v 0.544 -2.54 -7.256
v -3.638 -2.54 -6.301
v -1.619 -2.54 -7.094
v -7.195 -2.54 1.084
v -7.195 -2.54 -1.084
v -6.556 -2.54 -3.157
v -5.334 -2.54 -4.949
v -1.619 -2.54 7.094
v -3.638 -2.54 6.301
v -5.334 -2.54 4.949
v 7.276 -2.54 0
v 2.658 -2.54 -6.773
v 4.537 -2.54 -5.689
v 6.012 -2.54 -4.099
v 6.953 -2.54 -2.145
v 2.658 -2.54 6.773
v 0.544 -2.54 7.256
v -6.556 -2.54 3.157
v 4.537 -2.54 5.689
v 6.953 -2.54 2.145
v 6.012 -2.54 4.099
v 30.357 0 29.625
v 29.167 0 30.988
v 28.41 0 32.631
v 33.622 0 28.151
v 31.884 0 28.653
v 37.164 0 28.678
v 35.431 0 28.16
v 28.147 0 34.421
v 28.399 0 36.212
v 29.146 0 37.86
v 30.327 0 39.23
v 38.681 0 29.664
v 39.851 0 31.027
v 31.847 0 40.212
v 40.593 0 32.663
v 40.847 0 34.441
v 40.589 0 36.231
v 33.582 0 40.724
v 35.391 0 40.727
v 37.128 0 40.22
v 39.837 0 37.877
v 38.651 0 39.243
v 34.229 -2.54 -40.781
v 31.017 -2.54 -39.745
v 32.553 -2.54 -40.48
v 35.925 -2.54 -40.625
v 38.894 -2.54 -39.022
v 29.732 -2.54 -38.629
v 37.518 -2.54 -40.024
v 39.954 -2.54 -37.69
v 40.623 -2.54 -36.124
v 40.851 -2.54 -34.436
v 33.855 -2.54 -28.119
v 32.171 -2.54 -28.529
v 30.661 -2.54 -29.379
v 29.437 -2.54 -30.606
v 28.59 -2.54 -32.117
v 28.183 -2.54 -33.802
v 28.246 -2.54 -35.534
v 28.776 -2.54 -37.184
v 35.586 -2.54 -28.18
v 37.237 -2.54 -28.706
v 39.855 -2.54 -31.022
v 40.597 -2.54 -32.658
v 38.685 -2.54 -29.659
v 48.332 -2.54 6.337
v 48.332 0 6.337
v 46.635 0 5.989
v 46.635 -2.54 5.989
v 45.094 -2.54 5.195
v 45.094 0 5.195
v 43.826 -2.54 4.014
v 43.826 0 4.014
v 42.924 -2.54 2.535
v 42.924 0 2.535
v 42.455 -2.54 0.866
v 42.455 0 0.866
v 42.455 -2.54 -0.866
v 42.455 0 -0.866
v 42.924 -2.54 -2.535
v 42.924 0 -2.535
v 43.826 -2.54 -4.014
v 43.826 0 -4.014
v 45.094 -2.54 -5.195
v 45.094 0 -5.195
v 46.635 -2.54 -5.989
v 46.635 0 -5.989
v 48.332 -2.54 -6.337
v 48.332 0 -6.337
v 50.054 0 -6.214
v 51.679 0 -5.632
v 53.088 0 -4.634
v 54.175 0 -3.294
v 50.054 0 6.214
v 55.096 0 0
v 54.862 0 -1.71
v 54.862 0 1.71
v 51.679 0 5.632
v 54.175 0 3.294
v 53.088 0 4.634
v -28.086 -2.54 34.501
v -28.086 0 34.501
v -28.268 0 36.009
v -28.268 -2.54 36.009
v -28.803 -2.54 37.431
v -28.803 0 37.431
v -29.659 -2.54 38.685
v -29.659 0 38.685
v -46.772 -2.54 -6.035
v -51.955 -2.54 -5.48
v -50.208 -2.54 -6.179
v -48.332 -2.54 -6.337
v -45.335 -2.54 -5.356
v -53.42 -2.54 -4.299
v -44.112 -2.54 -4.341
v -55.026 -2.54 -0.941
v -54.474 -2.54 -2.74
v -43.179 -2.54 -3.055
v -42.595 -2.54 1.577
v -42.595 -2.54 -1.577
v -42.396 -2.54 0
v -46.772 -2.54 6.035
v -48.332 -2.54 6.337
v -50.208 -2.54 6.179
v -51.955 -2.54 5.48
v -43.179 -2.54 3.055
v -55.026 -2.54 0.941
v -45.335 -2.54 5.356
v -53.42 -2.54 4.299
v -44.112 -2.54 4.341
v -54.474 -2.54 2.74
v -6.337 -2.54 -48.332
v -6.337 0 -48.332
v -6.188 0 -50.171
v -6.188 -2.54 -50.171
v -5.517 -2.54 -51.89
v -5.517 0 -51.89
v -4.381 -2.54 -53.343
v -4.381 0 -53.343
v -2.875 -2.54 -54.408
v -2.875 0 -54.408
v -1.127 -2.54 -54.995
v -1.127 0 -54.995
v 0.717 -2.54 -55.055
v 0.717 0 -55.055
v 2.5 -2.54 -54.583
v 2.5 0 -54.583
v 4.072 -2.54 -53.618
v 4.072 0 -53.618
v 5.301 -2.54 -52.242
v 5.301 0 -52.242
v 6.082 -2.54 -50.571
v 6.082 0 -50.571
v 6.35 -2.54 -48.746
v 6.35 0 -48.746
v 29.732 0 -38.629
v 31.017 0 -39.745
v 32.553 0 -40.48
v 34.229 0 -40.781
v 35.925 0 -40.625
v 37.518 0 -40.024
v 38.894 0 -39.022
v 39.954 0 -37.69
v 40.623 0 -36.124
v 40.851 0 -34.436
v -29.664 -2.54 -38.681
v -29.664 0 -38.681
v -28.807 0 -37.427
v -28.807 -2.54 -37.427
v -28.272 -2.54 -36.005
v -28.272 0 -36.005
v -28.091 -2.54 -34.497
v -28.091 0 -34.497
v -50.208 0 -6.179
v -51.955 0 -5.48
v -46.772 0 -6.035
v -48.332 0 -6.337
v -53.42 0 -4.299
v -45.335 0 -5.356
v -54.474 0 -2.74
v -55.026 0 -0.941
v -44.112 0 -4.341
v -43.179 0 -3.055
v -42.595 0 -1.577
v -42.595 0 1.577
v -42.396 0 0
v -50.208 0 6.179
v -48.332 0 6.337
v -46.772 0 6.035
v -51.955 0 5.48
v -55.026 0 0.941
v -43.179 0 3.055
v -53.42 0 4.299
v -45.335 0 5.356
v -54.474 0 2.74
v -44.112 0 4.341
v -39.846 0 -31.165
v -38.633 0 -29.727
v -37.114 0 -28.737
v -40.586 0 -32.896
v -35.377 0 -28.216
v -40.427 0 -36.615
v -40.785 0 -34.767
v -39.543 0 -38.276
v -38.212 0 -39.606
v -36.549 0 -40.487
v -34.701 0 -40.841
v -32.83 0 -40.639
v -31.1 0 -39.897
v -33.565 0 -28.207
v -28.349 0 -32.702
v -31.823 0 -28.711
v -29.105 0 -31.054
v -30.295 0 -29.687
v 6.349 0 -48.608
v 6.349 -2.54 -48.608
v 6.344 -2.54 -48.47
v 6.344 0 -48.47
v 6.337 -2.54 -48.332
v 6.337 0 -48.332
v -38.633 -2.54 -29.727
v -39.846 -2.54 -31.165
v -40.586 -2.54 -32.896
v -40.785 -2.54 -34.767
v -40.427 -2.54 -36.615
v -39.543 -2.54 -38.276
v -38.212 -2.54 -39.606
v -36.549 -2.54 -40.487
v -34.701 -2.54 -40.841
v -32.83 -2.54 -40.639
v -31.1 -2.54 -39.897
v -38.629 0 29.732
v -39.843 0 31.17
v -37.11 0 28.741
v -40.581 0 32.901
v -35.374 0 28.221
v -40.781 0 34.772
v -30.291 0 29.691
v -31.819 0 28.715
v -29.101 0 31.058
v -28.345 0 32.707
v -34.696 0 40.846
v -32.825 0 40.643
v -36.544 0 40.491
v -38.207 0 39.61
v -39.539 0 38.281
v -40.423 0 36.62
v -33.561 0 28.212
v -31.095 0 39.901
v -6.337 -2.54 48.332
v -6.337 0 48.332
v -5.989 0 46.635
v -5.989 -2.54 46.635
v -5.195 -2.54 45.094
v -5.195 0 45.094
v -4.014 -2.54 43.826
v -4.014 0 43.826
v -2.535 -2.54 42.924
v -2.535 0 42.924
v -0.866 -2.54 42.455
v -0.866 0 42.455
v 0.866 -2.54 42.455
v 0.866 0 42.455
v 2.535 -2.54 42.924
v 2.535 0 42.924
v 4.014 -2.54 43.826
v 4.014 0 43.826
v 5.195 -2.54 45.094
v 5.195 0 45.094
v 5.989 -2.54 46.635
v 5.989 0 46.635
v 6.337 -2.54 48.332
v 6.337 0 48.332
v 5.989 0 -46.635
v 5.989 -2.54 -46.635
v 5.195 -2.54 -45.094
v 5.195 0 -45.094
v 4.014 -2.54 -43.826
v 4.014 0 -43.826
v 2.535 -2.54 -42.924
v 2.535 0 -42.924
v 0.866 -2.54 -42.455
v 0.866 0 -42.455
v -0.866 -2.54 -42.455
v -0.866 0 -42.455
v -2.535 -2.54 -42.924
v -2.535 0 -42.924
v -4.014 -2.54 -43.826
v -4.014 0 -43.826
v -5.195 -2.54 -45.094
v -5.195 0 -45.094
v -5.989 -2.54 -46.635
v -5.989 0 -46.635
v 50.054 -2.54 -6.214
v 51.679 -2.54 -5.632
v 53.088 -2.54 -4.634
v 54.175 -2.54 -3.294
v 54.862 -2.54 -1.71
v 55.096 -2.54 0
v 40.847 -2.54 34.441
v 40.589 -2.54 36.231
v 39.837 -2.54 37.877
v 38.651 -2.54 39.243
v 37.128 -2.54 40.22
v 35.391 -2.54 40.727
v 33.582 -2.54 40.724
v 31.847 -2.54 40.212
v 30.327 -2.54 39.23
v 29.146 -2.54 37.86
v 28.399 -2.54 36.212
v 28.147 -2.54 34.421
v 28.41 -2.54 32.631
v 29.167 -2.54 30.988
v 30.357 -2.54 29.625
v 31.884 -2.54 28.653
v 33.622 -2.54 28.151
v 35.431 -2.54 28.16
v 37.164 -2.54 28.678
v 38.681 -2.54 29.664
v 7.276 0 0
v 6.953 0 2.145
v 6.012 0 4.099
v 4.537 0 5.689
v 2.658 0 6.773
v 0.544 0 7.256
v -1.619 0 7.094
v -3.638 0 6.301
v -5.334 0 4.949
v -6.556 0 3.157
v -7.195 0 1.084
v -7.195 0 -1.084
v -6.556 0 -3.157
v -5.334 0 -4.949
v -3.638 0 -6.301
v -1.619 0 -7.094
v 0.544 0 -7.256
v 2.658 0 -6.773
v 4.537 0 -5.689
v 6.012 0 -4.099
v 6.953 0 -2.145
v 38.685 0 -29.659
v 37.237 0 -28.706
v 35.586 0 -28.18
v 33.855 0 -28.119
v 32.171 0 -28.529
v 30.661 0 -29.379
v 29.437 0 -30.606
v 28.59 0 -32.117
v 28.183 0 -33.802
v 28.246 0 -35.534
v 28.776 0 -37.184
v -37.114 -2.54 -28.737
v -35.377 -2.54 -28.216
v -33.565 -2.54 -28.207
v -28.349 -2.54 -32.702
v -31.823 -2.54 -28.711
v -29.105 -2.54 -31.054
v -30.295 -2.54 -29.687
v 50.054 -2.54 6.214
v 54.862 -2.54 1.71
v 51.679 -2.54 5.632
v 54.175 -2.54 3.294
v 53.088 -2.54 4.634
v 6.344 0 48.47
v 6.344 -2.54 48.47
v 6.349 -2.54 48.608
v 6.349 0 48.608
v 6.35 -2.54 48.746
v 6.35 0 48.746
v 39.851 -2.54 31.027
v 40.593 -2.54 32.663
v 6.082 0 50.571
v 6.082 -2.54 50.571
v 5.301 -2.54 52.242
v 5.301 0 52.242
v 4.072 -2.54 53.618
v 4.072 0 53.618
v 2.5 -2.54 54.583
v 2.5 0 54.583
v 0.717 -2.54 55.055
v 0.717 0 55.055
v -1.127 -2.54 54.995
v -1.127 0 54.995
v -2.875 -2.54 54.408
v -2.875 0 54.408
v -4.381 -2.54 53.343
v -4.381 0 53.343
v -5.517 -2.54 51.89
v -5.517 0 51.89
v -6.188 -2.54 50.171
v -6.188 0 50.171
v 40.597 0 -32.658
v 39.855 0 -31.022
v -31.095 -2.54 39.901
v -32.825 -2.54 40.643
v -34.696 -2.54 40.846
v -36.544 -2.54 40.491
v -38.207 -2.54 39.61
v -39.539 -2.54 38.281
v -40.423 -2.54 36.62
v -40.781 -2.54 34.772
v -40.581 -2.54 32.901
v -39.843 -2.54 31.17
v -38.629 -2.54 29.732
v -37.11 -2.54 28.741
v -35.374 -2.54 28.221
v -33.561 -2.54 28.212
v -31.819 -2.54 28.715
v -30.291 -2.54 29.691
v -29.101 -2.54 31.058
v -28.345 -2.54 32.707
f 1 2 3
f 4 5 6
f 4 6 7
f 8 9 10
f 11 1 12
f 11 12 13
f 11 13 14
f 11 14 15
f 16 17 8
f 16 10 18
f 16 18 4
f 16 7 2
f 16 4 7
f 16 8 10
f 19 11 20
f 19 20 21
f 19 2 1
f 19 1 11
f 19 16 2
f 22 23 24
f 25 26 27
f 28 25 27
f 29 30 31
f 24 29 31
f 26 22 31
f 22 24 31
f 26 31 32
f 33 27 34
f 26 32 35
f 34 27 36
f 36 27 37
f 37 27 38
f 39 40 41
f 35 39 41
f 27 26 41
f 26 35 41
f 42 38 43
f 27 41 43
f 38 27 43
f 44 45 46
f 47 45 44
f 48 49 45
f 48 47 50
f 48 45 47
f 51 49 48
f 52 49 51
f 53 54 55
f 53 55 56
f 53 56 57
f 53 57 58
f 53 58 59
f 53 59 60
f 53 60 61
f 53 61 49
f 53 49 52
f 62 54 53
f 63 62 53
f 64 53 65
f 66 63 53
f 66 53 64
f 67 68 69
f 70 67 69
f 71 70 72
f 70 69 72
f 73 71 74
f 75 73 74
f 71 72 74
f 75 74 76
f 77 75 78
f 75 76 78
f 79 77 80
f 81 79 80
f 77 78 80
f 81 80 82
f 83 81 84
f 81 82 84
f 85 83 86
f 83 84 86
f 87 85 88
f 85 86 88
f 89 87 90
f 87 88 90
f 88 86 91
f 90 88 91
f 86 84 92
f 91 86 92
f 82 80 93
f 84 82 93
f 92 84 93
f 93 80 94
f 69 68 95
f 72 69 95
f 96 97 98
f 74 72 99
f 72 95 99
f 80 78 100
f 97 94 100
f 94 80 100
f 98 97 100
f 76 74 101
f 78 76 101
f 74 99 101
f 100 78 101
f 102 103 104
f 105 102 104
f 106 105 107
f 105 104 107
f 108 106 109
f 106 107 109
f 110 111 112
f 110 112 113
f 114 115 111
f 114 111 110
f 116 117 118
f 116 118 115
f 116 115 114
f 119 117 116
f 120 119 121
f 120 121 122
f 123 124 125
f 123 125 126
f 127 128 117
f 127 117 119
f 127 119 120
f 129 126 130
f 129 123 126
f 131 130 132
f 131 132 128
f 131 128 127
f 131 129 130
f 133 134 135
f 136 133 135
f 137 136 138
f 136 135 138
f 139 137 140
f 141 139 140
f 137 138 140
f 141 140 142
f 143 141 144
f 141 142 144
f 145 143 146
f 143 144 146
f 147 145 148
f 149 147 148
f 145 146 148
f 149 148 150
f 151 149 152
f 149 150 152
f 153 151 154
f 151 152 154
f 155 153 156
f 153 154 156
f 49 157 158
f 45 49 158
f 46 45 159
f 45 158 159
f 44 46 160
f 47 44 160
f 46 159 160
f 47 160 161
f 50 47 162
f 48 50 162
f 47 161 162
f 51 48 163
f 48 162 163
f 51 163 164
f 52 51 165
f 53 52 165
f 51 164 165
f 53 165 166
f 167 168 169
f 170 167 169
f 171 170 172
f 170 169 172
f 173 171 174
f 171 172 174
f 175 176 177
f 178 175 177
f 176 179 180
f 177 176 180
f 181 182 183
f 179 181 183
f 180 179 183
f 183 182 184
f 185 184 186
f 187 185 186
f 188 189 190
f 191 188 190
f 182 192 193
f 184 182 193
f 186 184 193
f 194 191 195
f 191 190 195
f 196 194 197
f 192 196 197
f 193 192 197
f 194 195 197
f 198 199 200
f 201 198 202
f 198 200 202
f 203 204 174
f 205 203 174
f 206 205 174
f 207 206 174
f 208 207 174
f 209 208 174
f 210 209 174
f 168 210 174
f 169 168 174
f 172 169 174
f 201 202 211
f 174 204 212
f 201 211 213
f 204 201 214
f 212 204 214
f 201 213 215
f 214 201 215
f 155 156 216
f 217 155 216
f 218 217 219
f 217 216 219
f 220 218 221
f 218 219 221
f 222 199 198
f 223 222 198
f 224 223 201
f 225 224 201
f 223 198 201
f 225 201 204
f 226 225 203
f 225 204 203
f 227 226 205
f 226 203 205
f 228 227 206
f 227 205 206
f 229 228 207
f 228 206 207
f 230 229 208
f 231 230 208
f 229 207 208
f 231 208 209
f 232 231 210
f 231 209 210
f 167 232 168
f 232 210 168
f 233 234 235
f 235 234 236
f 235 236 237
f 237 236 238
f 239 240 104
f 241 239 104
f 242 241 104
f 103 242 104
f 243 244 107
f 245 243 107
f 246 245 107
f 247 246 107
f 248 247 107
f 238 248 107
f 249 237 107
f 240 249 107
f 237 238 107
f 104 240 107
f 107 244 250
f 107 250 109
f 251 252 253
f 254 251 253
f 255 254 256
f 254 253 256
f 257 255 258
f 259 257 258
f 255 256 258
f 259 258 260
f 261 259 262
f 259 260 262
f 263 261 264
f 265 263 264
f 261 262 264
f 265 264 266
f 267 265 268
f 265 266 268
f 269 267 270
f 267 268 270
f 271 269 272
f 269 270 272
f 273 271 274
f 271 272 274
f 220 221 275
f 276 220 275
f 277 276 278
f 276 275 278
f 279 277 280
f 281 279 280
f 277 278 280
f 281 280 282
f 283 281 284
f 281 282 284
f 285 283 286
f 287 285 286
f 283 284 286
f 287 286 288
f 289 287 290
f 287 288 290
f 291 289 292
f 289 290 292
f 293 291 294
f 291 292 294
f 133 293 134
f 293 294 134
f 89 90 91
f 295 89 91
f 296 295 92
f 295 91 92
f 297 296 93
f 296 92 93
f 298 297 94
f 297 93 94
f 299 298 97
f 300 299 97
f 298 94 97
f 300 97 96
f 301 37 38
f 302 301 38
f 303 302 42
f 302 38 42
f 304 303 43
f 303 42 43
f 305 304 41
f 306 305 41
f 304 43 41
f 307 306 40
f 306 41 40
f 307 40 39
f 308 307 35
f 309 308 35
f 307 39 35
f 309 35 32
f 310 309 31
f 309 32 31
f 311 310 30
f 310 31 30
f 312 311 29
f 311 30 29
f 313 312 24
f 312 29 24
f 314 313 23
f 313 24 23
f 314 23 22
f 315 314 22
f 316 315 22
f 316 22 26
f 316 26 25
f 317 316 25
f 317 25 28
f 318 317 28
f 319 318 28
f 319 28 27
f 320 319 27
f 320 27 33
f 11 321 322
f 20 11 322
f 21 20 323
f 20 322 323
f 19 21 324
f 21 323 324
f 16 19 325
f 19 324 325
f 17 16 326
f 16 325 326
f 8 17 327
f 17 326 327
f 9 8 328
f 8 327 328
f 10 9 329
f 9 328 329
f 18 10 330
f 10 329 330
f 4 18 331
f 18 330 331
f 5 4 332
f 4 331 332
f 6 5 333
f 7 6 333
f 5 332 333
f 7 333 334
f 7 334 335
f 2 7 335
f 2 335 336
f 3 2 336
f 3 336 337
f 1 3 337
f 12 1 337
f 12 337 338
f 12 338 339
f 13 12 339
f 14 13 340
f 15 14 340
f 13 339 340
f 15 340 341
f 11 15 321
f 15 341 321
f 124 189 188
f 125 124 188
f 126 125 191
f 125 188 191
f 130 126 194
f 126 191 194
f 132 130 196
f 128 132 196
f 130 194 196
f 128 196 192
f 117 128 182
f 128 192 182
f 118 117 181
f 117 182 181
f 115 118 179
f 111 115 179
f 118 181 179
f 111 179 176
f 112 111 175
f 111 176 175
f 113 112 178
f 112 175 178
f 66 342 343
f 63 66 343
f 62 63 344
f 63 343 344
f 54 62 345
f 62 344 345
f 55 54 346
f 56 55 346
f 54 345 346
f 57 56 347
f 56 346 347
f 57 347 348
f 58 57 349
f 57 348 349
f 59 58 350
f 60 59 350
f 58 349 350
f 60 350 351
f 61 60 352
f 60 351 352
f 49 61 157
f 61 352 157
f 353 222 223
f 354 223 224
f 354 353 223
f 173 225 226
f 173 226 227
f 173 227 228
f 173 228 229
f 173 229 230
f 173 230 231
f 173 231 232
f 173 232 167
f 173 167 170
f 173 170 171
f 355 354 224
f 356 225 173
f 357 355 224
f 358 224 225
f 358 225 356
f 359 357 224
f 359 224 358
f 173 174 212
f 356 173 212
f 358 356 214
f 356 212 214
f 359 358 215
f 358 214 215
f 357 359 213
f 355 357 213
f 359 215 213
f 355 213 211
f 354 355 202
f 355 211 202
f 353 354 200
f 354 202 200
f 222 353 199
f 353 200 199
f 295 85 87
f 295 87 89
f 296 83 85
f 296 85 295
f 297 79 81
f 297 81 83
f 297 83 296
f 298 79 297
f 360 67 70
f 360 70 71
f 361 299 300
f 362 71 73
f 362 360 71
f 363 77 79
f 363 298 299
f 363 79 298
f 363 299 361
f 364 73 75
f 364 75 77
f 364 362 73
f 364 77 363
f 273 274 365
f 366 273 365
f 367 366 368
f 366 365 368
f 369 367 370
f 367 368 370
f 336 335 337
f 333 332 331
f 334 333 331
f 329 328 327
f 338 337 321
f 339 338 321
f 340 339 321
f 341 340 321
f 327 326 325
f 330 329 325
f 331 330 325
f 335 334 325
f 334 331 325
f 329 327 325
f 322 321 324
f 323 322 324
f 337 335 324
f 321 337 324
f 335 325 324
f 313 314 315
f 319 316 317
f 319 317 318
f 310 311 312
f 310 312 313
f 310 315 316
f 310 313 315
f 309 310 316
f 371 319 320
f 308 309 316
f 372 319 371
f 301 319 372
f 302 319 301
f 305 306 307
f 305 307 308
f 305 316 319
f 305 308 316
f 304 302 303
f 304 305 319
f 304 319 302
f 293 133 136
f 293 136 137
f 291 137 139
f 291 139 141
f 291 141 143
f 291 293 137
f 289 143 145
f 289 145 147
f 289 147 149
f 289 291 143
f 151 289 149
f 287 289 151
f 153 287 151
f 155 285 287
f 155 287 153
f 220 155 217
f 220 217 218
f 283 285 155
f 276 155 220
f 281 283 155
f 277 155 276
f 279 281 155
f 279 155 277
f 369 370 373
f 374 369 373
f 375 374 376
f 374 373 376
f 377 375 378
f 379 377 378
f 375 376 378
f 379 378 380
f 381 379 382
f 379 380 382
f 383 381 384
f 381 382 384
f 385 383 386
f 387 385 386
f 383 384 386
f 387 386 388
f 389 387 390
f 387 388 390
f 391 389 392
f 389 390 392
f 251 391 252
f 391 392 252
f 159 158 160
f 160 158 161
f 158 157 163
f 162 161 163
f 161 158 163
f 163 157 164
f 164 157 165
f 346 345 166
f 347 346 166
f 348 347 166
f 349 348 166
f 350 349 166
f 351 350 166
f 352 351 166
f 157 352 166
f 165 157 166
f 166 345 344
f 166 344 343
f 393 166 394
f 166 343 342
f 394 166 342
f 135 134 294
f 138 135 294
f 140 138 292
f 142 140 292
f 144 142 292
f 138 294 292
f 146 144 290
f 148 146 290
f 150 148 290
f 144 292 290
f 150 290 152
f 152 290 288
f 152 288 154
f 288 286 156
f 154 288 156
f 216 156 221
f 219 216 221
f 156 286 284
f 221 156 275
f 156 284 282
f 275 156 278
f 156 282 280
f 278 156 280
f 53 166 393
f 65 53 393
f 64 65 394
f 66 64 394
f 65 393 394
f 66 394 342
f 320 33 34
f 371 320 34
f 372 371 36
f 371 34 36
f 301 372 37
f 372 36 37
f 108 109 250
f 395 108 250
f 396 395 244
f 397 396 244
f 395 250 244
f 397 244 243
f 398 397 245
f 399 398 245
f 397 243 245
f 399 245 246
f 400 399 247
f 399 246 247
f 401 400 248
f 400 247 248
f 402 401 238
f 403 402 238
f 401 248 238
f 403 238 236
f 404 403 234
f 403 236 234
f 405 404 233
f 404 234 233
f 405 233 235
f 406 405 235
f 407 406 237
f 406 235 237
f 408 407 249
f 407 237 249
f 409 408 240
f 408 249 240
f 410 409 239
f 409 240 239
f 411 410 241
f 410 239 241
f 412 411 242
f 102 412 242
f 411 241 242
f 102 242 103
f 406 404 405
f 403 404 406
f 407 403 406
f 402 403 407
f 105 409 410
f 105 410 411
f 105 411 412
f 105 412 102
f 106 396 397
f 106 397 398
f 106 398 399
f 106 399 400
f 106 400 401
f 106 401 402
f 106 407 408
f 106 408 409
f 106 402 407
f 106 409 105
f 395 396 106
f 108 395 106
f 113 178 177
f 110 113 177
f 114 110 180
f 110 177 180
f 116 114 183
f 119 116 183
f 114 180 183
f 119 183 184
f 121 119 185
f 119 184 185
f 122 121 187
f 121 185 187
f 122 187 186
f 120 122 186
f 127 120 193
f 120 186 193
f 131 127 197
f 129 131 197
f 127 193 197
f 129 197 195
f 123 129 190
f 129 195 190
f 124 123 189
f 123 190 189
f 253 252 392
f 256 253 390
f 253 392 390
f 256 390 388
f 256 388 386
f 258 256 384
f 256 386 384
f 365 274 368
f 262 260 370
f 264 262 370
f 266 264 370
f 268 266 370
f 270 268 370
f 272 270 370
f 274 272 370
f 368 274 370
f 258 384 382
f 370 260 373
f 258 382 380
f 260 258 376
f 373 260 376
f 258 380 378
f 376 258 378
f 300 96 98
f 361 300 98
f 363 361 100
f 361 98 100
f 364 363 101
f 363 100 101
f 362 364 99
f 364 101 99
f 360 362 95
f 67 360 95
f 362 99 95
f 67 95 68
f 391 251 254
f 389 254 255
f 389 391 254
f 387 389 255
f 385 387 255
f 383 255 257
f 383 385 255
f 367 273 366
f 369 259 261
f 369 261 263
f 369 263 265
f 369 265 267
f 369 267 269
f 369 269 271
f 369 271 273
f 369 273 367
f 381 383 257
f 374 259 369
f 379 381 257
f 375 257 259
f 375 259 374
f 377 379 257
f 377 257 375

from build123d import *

# Parameters (mm, degrees)
F1_DEPTH = 2.54
F0_R     = 7.2761689779


with BuildPart() as f1:
    # F0 (on Front) → F1 (new body)
    with BuildSketch(Plane.XZ):
        with BuildLine():
            ThreePointArc((-38.6289761731, 29.7318574602), (-34.4363682798, 34.5009809702), (-29.6593939712, 38.6846416227))
            ThreePointArc((-29.6593939712, 38.6846416227), (-38.9222859219, 38.9953155048), (-38.628976173, 29.7318574602))
        make_face()
        with BuildLine():
            ThreePointArc((-28.0863682798, 34.5009809702), (-28.4926200155, 36.7357866822), (-29.6593939712, 38.6846416227))
            ThreePointArc((-29.6593939712, 38.6846416227), (-34.4363682798, 34.5009809702), (-38.6289761731, 29.7318574602))
            ThreePointArc((-38.628976173, 29.7318574602), (-31.8191713176, 28.7154144413), (-28.0863682798, 34.5009809702))
        make_face()
    extrude(amount=F1_DEPTH)


with BuildPart() as f1b:
    # F0 (on Front) → F1, piece 2 (new body)
    with BuildSketch(Plane.XZ):
        with BuildLine():
            ThreePointArc((6.3365161788, 48.3324912551), (0, 48.7460885427), (-6.3365161788, 48.3324912551))
            ThreePointArc((-6.3365161788, 48.3324912551), (0, 42.3960885427), (6.3365161788, 48.3324912551))
        make_face()
        with BuildLine():
            ThreePointArc((6.3365161788, 48.3324912551), (6.3466281495, 48.5391800305), (6.35, 48.7460885427))
            ThreePointArc((6.35, 48.7460885427), (-0.2069085122, 55.0927166922), (-6.3365161788, 48.3324912551))
            ThreePointArc((-6.3365161788, 48.3324912551), (0, 48.7460885427), (6.3365161788, 48.3324912551))
        make_face()
    extrude(amount=F1_DEPTH)


with BuildPart() as f1c:
    # F0 (on Front) → F1, piece 3 (new body)
    with BuildSketch(Plane.XZ):
        with BuildLine():
            ThreePointArc((38.6809602201, 29.6641949943), (34.4967067172, 34.4406500212), (29.7270628884, 38.6326659737))
            ThreePointArc((29.7270628884, 38.6326659737), (30.0029289762, 29.9541746101), (38.6809602201, 29.6641949943))
        make_face()
        with BuildLine():
            ThreePointArc((40.8467067172, 34.4406500212), (36.7367136019, 40.3824400845), (29.7270628884, 38.6326659737))
            ThreePointArc((29.7270628884, 38.6326659737), (34.4967067172, 34.4406500212), (38.6809602201, 29.6641949943))
            ThreePointArc((38.6809602201, 29.6641949943), (40.279980433, 31.8183904748), (40.8467067172, 34.4406500212))
        make_face()
    extrude(amount=F1_DEPTH)


with BuildPart() as f1d:
    # F0 (on Front) → F1, piece 4 (new body)
    with BuildSketch(Plane.XZ):
        Circle(F0_R)
    extrude(amount=F1_DEPTH)


with BuildPart() as f1e:
    # F0 (on Front) → F1, piece 5 (new body)
    with BuildSketch(Plane.XZ):
        with BuildLine():
            ThreePointArc((55.0960885427, 0), (53.0875259328, 4.6340502142), (48.3324912551, 6.3365161788))
            ThreePointArc((48.3324912551, 6.3365161788), (48.6425793232, 3.175), (48.7460885427, 0))
            ThreePointArc((48.7460885427, 0), (48.6425793232, -3.175), (48.3324912551, -6.3365161788))
            ThreePointArc((48.3324912551, -6.3365161788), (53.0875259328, -4.6340502142), (55.0960885427, 0))
        make_face()
        with BuildLine():
            ThreePointArc((48.7460885427, 0), (48.6425793232, 3.175), (48.3324912551, 6.3365161788))
            ThreePointArc((48.3324912551, 6.3365161788), (42.3960885427, 0), (48.3324912551, -6.3365161788))
            ThreePointArc((48.3324912551, -6.3365161788), (48.6425793232, -3.175), (48.7460885427, 0))
        make_face()
    extrude(amount=F1_DEPTH)


with BuildPart() as f1f:
    # F0 (on Front) → F1, piece 6 (new body)
    with BuildSketch(Plane.XZ):
        with BuildLine():
            ThreePointArc((40.8509809702, -34.4363682798), (40.2840919472, -31.81374985), (38.6846416227, -29.6593939712))
            ThreePointArc((38.6846416227, -29.6593939712), (34.5009809702, -34.4363682798), (29.7318574602, -38.628976173))
            ThreePointArc((29.7318574602, -38.628976173), (36.7413565762, -40.3780193252), (40.8509809702, -34.4363682798))
        make_face()
        with BuildLine():
            ThreePointArc((29.7318574602, -38.628976173), (34.5009809702, -34.4363682798), (38.6846416227, -29.6593939712))
            ThreePointArc((38.6846416227, -29.6593939712), (30.0066464357, -29.9504506377), (29.7318574602, -38.628976173))
        make_face()
    extrude(amount=F1_DEPTH)


with BuildPart() as f1g:
    # F0 (on Front) → F1, piece 7 (new body)
    with BuildSketch(Plane.XZ):
        with BuildLine():
            ThreePointArc((6.3365161788, -48.3324912551), (0, -48.7460885427), (-6.3365161788, -48.3324912551))
            ThreePointArc((-6.3365161788, -48.3324912551), (-0.2069085122, -55.0927166922), (6.35, -48.7460885427))
            ThreePointArc((6.35, -48.7460885427), (6.3466281495, -48.5391800305), (6.3365161788, -48.3324912551))
        make_face()
        with BuildLine():
            ThreePointArc((6.3365161788, -48.3324912551), (0, -42.3960885427), (-6.3365161788, -48.3324912551))
            ThreePointArc((-6.3365161788, -48.3324912551), (0, -48.7460885427), (6.3365161788, -48.3324912551))
        make_face()
    extrude(amount=F1_DEPTH)


with BuildPart() as f1h:
    # F0 (on Front) → F1, piece 8 (new body)
    with BuildSketch(Plane.XZ):
        with BuildLine():
            ThreePointArc((-29.6641949943, -38.6809602201), (-34.4406500212, -34.4967067172), (-38.6326659737, -29.7270628884))
            ThreePointArc((-38.6326659737, -29.7270628884), (-38.9271254323, -38.9904844582), (-29.6641949943, -38.6809602201))
        make_face()
        with BuildLine():
            ThreePointArc((-28.0906500212, -34.4967067172), (-31.8230940331, -28.711302613), (-38.6326659737, -29.7270628884))
            ThreePointArc((-38.6326659737, -29.7270628884), (-34.4406500212, -34.4967067172), (-29.6641949943, -38.6809602201))
            ThreePointArc((-29.6641949943, -38.6809602201), (-28.497040452, -36.7318812719), (-28.0906500212, -34.4967067172))
        make_face()
    extrude(amount=F1_DEPTH)


with BuildPart() as f1i:
    # F0 (on Front) → F1, piece 9 (new body)
    with BuildSketch(Plane.XZ):
        with BuildLine():
            ThreePointArc((-48.3324912551, -6.3365161788), (-48.7460885427, 0), (-48.3324912551, 6.3365161788))
            ThreePointArc((-48.3324912551, 6.3365161788), (-55.0960885427, 0), (-48.3324912551, -6.3365161788))
        make_face()
        with BuildLine():
            ThreePointArc((-42.3960885427, 0), (-44.1120383285, 4.3414373901), (-48.3324912551, 6.3365161788))
            ThreePointArc((-48.3324912551, 6.3365161788), (-48.7460885427, 0), (-48.3324912551, -6.3365161788))
            ThreePointArc((-48.3324912551, -6.3365161788), (-44.1120383285, -4.3414373901), (-42.3960885427, 0))
        make_face()
    extrude(amount=F1_DEPTH)


solid = Compound([f1.part, f1b.part, f1c.part, f1d.part, f1e.part, f1f.part, f1g.part, f1h.part, f1i.part])
